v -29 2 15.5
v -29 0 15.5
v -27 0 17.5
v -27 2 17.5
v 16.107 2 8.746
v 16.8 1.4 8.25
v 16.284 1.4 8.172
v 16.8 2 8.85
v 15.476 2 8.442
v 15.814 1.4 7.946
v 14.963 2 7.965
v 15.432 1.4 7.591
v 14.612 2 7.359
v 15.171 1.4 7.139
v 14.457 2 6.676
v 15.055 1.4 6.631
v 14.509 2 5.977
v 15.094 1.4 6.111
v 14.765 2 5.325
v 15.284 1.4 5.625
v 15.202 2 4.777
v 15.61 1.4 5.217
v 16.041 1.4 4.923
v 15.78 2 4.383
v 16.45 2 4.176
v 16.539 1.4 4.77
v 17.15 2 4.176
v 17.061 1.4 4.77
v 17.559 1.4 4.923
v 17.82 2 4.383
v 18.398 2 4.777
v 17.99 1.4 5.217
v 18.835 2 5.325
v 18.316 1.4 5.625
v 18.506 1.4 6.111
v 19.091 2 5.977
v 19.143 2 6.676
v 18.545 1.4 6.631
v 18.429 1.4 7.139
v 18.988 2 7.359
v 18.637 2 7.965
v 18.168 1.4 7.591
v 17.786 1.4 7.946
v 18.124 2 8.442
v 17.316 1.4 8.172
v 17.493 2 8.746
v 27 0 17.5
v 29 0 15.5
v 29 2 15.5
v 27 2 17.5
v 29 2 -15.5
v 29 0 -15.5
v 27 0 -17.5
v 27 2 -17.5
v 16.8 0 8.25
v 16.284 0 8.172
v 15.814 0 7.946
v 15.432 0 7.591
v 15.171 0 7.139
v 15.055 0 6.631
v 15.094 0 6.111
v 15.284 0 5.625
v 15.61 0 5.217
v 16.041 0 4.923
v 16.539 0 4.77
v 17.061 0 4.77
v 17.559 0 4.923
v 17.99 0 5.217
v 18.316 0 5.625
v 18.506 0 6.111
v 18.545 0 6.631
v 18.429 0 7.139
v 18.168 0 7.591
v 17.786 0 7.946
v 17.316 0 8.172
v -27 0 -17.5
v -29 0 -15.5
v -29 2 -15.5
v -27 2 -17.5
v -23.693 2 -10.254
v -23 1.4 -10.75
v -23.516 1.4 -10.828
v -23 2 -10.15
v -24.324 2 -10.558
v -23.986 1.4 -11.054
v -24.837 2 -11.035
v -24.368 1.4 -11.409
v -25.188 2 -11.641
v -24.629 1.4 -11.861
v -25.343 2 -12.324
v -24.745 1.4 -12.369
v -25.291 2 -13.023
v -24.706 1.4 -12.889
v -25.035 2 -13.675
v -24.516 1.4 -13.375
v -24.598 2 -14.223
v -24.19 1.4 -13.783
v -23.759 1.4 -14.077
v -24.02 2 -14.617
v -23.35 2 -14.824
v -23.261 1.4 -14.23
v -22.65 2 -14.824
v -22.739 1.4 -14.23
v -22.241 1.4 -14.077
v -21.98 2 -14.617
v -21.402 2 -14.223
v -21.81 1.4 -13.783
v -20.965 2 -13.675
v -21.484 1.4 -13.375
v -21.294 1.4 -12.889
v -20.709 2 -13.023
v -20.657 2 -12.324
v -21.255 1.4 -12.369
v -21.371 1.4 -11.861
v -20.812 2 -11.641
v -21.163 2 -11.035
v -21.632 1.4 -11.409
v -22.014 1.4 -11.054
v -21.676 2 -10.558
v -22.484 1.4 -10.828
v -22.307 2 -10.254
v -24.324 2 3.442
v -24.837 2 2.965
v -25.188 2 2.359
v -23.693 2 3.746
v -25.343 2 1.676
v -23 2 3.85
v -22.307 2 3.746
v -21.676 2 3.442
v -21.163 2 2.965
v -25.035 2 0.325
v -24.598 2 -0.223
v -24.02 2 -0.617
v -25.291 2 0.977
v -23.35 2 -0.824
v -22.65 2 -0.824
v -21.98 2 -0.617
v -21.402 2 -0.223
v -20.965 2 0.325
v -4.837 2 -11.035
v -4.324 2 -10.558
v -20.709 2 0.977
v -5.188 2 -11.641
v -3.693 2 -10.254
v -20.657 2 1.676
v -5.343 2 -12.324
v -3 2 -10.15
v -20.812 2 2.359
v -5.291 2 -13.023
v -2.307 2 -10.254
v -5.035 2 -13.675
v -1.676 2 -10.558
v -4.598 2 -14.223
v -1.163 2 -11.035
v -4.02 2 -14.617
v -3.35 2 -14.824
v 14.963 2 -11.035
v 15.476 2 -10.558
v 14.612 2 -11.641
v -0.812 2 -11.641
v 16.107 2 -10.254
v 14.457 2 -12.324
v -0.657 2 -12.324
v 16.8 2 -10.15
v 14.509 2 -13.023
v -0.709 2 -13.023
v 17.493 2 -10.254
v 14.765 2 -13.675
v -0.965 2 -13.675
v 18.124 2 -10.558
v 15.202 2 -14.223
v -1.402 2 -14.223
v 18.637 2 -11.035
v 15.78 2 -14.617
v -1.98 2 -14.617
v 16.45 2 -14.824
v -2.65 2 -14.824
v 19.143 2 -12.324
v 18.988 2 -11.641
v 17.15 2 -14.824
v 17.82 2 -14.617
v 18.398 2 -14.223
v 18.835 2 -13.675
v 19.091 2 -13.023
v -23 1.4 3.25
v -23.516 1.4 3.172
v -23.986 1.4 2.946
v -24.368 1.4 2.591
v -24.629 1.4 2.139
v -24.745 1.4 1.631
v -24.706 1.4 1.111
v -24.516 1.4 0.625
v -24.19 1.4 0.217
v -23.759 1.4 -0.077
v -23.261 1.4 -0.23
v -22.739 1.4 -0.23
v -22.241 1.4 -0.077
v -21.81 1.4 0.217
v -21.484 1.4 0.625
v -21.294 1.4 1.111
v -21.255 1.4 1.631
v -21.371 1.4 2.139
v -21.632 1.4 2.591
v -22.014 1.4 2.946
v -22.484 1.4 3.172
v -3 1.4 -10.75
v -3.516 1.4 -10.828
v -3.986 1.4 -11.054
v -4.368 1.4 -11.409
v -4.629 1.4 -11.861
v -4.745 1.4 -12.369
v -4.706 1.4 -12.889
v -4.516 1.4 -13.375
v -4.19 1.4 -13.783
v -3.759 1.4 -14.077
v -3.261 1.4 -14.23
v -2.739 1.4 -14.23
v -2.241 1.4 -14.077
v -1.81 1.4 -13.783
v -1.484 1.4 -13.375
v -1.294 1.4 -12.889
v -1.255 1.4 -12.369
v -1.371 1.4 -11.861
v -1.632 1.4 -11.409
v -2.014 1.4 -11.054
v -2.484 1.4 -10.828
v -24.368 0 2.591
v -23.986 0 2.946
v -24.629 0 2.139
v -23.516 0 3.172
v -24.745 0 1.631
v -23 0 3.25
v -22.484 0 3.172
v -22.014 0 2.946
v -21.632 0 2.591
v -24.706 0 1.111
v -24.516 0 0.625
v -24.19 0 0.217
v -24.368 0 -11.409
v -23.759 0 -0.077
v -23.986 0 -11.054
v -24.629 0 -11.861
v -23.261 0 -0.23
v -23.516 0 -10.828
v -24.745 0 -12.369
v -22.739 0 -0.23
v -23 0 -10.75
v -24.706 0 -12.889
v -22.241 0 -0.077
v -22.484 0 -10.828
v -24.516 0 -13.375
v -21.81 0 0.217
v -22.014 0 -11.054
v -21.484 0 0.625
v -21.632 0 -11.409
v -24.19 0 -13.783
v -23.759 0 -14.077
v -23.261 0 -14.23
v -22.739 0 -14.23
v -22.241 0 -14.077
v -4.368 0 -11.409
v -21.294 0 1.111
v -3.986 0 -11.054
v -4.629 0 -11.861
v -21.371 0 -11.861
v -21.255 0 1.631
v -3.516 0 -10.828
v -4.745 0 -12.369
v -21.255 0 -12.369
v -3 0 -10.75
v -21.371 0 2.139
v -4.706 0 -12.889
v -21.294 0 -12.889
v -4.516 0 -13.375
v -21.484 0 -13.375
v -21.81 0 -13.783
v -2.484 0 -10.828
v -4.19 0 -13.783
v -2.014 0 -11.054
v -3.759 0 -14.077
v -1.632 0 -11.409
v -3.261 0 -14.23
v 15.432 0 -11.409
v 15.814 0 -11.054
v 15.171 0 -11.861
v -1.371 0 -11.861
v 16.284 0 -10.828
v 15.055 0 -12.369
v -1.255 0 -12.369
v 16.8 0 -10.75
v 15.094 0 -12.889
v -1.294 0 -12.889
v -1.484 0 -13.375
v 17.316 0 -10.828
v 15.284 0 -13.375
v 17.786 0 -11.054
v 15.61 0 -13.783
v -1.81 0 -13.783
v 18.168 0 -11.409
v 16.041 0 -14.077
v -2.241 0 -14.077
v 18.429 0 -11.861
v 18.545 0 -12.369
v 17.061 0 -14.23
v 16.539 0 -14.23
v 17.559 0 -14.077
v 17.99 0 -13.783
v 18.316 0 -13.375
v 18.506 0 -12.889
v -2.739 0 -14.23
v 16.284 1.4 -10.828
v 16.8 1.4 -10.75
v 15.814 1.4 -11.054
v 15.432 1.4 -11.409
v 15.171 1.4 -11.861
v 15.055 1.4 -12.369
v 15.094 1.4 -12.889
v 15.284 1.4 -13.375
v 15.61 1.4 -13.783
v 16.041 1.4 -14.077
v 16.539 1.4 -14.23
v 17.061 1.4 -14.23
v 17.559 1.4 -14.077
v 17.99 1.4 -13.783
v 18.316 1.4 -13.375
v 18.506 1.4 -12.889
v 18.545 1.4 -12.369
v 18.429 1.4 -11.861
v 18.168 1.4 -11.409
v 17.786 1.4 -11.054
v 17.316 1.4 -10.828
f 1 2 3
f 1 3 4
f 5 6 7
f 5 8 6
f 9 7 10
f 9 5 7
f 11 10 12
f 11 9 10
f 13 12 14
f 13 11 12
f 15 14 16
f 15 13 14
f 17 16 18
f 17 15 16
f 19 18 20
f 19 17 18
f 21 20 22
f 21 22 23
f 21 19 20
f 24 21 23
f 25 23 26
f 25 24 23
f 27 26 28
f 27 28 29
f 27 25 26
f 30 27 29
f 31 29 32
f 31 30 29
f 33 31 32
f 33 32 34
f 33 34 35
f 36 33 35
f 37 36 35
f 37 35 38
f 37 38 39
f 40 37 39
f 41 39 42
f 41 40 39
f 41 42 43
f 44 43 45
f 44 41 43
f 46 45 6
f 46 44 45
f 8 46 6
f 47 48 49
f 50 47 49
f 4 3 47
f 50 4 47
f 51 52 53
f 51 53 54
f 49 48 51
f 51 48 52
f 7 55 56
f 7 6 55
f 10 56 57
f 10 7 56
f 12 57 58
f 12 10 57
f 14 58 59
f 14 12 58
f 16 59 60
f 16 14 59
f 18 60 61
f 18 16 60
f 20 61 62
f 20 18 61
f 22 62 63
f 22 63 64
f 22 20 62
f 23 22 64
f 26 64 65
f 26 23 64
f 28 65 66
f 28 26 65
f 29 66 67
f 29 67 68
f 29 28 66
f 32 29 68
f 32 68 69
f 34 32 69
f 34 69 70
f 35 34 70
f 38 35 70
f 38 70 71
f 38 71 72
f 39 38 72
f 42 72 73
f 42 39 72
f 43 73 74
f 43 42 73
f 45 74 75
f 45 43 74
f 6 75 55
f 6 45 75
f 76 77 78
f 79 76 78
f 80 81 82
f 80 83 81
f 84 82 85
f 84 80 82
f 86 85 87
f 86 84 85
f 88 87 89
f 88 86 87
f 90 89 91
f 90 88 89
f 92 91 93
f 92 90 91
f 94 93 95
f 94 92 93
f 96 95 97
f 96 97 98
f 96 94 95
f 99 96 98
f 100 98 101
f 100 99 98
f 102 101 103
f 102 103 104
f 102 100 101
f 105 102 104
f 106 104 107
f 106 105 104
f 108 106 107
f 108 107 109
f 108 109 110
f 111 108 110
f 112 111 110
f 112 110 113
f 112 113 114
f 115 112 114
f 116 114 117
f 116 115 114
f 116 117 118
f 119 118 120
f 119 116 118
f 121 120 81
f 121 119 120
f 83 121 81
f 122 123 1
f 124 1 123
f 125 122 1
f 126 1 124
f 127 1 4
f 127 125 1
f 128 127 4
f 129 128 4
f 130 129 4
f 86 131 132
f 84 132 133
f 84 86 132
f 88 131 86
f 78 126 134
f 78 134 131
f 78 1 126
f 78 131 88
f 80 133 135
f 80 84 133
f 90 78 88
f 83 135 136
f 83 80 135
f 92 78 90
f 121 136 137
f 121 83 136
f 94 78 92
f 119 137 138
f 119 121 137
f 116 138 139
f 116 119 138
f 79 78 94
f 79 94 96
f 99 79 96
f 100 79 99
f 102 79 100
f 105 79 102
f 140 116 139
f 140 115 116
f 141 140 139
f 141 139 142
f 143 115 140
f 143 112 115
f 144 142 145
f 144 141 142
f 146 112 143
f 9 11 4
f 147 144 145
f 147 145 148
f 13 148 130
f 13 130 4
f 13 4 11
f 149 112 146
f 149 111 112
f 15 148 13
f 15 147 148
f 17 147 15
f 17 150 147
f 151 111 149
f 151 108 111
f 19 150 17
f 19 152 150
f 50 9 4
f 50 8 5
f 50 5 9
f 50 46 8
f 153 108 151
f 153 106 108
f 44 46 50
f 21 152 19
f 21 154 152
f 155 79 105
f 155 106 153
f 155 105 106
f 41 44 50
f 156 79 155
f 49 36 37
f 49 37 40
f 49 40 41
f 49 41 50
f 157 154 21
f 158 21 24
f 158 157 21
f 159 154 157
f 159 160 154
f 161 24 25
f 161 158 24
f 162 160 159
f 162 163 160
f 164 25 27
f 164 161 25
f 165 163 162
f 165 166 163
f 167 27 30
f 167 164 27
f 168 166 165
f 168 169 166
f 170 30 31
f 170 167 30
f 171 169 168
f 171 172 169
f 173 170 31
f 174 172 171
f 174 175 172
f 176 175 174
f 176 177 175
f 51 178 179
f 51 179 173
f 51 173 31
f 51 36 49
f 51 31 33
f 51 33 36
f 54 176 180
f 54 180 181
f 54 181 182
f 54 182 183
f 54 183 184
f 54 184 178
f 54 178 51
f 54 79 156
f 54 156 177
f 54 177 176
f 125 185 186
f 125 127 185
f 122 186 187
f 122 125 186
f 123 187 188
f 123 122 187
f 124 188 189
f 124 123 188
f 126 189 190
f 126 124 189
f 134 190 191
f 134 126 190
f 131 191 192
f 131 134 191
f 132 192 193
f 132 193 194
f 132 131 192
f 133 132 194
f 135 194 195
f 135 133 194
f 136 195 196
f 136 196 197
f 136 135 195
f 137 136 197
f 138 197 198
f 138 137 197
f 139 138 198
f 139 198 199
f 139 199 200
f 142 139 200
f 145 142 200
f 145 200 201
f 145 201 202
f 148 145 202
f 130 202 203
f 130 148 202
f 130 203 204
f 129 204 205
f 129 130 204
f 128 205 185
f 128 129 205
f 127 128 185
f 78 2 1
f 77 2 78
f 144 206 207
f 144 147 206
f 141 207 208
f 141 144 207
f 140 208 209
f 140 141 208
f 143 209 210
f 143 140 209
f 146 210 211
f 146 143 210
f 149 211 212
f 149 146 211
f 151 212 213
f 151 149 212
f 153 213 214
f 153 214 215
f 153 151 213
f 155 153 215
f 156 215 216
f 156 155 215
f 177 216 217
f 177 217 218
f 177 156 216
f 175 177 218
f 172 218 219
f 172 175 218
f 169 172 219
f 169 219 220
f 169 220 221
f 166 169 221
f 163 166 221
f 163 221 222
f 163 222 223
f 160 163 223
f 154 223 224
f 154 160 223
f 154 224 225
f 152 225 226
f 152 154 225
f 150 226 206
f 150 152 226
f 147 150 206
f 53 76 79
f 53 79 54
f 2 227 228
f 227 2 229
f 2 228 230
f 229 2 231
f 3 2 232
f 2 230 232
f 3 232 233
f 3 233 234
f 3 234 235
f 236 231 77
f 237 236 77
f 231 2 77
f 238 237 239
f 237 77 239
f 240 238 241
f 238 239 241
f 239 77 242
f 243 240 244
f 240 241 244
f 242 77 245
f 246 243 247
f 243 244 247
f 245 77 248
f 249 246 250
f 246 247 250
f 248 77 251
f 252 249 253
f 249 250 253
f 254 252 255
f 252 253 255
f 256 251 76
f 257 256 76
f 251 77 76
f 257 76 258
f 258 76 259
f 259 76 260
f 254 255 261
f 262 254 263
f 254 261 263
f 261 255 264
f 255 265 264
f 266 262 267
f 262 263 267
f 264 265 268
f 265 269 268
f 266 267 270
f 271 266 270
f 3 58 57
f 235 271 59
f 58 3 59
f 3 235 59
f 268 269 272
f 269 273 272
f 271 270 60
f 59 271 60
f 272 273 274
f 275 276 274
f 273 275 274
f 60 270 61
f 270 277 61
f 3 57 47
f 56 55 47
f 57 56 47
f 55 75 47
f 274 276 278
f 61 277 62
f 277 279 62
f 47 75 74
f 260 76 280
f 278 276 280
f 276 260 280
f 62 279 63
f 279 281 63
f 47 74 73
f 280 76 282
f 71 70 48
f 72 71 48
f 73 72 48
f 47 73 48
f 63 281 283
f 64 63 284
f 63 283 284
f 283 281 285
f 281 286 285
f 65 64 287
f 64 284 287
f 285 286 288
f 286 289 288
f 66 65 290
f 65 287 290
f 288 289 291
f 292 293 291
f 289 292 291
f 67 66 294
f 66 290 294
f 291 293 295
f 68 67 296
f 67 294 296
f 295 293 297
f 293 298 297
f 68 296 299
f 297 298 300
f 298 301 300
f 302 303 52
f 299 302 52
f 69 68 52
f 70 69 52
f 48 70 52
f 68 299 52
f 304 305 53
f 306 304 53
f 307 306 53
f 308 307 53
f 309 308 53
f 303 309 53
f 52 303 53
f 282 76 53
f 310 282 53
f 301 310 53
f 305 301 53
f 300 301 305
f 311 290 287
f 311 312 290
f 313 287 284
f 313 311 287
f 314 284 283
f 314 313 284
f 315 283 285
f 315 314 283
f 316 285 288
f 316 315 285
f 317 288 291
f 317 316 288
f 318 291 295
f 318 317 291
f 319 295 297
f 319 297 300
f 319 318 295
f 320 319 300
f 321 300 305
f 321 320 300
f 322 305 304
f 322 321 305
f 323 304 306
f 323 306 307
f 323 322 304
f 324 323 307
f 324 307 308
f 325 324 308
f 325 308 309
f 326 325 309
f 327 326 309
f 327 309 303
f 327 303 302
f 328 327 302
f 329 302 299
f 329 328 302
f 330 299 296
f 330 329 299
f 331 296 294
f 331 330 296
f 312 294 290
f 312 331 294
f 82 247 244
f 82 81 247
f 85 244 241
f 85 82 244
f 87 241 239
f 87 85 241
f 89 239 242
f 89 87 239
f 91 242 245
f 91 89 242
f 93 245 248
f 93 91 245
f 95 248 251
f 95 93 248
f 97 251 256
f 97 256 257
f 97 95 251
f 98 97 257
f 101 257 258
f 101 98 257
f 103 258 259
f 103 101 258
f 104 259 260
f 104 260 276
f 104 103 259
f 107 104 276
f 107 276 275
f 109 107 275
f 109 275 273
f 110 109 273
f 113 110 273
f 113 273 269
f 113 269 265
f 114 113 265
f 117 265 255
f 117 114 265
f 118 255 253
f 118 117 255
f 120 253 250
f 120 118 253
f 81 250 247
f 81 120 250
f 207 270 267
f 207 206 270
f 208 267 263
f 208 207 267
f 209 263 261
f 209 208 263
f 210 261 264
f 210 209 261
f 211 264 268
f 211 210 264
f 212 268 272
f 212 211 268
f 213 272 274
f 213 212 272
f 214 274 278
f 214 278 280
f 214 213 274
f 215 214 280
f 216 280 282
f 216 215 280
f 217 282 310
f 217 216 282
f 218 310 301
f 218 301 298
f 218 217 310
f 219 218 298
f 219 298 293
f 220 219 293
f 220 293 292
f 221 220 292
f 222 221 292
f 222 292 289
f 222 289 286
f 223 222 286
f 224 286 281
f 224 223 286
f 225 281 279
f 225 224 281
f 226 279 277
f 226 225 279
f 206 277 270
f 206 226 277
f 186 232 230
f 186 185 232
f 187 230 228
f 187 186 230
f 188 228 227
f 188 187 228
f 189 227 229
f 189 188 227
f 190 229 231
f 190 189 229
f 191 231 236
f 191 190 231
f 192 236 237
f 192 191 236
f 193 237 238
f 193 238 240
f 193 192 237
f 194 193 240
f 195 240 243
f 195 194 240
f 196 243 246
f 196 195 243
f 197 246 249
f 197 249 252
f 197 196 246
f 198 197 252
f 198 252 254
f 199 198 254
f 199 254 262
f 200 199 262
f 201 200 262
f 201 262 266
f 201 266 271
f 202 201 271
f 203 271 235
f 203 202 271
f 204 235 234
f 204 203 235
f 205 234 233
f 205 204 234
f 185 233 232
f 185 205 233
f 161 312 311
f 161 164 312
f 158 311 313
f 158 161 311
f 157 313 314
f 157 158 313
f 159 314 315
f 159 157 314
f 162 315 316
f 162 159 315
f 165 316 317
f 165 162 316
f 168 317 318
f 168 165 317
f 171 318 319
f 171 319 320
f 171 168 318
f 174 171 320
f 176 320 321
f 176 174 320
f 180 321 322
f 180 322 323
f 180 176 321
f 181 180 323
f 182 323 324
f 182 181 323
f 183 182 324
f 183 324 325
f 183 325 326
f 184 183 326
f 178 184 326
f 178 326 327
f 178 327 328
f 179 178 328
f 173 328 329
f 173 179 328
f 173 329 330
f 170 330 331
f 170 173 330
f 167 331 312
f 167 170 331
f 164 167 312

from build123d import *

# Parameters (mm, degrees)
SKETCH1_W                                    = 58
SKETCH1_H                                    = 35
BOSS_EXTRUDE1_DEPTH                          = 2
CSK_FOR_ST2_2_CROSS_RECESSED_CTSK_HE_2_COUNT = 2
CSK_FOR_ST2_2_CROSS_RECESSED_CTSK_HE_2_PITCH = 20
CSK_FOR_ST2_2_CROSS_RECESSED_CTSK_HE_3_COUNT = 2
CSK_FOR_ST2_2_CROSS_RECESSED_CTSK_HE_3_PITCH = 39.8
CSK_FOR_ST2_2_CROSS_RECESSED_CTSK_HE_4_COUNT = 2
CSK_FOR_ST2_2_CROSS_RECESSED_CTSK_HE_4_PITCH = 44.102607633
CSK_FOR_ST2_2_CROSS_RECESSED_CTSK_HE_5_COUNT = 2
CSK_FOR_ST2_2_CROSS_RECESSED_CTSK_HE_5_PITCH = 14
CHAMFER1_SIZE                                = 2


with BuildPart() as part:
    # Sketch1 → Boss-Extrude1 (new body)
    with BuildSketch(Plane(origin=(0, 0, 0), x_dir=(1, 0, 0), z_dir=(0, 1, 0))):
        Rectangle(SKETCH1_W, SKETCH1_H)
    extrude(amount=BOSS_EXTRUDE1_DEPTH)

    # Sketch3 → CSK for ST2.2 Cross recessed CTSK head tapping screws1 (revolve, cut)
    with BuildSketch(Plane(origin=(-23, 2, -12.5), x_dir=(0, 0, 1), z_dir=(1, 0, 0))):
        Polygon((0, 0), (0, 2), (1.75, 2), (1.75, 0.6), (2.35, 0), align=None)
    csk_for_st2_2_cross_recessed_ctsk_head_t = revolve(axis=Axis((-23, 8.35, -12.5), (0, -1, 0)), mode=Mode.SUBTRACT)

    # CSK for ST2.2 Cross recessed CTSK he 2: CSK for ST2.2 Cross recessed CTSK head tapping screws1 ×2
    with Locations(*[(i * CSK_FOR_ST2_2_CROSS_RECESSED_CTSK_HE_2_PITCH, 0, 0) for i in range(1, CSK_FOR_ST2_2_CROSS_RECESSED_CTSK_HE_2_COUNT)]):
        add(csk_for_st2_2_cross_recessed_ctsk_head_t, mode=Mode.SUBTRACT)

    # CSK for ST2.2 Cross recessed CTSK he 3: CSK for ST2.2 Cross recessed CTSK head tapping screws1 ×2
    with Locations(*[(i * CSK_FOR_ST2_2_CROSS_RECESSED_CTSK_HE_3_PITCH, 0, 0) for i in range(1, CSK_FOR_ST2_2_CROSS_RECESSED_CTSK_HE_3_COUNT)]):
        add(csk_for_st2_2_cross_recessed_ctsk_head_t, mode=Mode.SUBTRACT)

    # CSK for ST2.2 Cross recessed CTSK he 4: CSK for ST2.2 Cross recessed CTSK head tapping screws1 ×2
    with Locations(*[Vector(0.9024409697382602, 0, 0.4308135282670086) * (i * CSK_FOR_ST2_2_CROSS_RECESSED_CTSK_HE_4_PITCH) for i in range(1, CSK_FOR_ST2_2_CROSS_RECESSED_CTSK_HE_4_COUNT)]):
        add(csk_for_st2_2_cross_recessed_ctsk_head_t, mode=Mode.SUBTRACT)

    # CSK for ST2.2 Cross recessed CTSK he 5: CSK for ST2.2 Cross recessed CTSK head tapping screws1 ×2
    with Locations(*[(0, 0, i * CSK_FOR_ST2_2_CROSS_RECESSED_CTSK_HE_5_PITCH) for i in range(1, CSK_FOR_ST2_2_CROSS_RECESSED_CTSK_HE_5_COUNT)]):
        add(csk_for_st2_2_cross_recessed_ctsk_head_t, mode=Mode.SUBTRACT)

    # Chamfer1
    chamfer1_edges = [part.edges().sort_by_distance(p)[0] for p in [
        (29, 1, 17.5),
        (-29, 1, 17.5),
        (-29, 1, -17.5),
        (29, 1, -17.5),
    ]]
    chamfer(chamfer1_edges, length=CHAMFER1_SIZE)


solid = part.part
